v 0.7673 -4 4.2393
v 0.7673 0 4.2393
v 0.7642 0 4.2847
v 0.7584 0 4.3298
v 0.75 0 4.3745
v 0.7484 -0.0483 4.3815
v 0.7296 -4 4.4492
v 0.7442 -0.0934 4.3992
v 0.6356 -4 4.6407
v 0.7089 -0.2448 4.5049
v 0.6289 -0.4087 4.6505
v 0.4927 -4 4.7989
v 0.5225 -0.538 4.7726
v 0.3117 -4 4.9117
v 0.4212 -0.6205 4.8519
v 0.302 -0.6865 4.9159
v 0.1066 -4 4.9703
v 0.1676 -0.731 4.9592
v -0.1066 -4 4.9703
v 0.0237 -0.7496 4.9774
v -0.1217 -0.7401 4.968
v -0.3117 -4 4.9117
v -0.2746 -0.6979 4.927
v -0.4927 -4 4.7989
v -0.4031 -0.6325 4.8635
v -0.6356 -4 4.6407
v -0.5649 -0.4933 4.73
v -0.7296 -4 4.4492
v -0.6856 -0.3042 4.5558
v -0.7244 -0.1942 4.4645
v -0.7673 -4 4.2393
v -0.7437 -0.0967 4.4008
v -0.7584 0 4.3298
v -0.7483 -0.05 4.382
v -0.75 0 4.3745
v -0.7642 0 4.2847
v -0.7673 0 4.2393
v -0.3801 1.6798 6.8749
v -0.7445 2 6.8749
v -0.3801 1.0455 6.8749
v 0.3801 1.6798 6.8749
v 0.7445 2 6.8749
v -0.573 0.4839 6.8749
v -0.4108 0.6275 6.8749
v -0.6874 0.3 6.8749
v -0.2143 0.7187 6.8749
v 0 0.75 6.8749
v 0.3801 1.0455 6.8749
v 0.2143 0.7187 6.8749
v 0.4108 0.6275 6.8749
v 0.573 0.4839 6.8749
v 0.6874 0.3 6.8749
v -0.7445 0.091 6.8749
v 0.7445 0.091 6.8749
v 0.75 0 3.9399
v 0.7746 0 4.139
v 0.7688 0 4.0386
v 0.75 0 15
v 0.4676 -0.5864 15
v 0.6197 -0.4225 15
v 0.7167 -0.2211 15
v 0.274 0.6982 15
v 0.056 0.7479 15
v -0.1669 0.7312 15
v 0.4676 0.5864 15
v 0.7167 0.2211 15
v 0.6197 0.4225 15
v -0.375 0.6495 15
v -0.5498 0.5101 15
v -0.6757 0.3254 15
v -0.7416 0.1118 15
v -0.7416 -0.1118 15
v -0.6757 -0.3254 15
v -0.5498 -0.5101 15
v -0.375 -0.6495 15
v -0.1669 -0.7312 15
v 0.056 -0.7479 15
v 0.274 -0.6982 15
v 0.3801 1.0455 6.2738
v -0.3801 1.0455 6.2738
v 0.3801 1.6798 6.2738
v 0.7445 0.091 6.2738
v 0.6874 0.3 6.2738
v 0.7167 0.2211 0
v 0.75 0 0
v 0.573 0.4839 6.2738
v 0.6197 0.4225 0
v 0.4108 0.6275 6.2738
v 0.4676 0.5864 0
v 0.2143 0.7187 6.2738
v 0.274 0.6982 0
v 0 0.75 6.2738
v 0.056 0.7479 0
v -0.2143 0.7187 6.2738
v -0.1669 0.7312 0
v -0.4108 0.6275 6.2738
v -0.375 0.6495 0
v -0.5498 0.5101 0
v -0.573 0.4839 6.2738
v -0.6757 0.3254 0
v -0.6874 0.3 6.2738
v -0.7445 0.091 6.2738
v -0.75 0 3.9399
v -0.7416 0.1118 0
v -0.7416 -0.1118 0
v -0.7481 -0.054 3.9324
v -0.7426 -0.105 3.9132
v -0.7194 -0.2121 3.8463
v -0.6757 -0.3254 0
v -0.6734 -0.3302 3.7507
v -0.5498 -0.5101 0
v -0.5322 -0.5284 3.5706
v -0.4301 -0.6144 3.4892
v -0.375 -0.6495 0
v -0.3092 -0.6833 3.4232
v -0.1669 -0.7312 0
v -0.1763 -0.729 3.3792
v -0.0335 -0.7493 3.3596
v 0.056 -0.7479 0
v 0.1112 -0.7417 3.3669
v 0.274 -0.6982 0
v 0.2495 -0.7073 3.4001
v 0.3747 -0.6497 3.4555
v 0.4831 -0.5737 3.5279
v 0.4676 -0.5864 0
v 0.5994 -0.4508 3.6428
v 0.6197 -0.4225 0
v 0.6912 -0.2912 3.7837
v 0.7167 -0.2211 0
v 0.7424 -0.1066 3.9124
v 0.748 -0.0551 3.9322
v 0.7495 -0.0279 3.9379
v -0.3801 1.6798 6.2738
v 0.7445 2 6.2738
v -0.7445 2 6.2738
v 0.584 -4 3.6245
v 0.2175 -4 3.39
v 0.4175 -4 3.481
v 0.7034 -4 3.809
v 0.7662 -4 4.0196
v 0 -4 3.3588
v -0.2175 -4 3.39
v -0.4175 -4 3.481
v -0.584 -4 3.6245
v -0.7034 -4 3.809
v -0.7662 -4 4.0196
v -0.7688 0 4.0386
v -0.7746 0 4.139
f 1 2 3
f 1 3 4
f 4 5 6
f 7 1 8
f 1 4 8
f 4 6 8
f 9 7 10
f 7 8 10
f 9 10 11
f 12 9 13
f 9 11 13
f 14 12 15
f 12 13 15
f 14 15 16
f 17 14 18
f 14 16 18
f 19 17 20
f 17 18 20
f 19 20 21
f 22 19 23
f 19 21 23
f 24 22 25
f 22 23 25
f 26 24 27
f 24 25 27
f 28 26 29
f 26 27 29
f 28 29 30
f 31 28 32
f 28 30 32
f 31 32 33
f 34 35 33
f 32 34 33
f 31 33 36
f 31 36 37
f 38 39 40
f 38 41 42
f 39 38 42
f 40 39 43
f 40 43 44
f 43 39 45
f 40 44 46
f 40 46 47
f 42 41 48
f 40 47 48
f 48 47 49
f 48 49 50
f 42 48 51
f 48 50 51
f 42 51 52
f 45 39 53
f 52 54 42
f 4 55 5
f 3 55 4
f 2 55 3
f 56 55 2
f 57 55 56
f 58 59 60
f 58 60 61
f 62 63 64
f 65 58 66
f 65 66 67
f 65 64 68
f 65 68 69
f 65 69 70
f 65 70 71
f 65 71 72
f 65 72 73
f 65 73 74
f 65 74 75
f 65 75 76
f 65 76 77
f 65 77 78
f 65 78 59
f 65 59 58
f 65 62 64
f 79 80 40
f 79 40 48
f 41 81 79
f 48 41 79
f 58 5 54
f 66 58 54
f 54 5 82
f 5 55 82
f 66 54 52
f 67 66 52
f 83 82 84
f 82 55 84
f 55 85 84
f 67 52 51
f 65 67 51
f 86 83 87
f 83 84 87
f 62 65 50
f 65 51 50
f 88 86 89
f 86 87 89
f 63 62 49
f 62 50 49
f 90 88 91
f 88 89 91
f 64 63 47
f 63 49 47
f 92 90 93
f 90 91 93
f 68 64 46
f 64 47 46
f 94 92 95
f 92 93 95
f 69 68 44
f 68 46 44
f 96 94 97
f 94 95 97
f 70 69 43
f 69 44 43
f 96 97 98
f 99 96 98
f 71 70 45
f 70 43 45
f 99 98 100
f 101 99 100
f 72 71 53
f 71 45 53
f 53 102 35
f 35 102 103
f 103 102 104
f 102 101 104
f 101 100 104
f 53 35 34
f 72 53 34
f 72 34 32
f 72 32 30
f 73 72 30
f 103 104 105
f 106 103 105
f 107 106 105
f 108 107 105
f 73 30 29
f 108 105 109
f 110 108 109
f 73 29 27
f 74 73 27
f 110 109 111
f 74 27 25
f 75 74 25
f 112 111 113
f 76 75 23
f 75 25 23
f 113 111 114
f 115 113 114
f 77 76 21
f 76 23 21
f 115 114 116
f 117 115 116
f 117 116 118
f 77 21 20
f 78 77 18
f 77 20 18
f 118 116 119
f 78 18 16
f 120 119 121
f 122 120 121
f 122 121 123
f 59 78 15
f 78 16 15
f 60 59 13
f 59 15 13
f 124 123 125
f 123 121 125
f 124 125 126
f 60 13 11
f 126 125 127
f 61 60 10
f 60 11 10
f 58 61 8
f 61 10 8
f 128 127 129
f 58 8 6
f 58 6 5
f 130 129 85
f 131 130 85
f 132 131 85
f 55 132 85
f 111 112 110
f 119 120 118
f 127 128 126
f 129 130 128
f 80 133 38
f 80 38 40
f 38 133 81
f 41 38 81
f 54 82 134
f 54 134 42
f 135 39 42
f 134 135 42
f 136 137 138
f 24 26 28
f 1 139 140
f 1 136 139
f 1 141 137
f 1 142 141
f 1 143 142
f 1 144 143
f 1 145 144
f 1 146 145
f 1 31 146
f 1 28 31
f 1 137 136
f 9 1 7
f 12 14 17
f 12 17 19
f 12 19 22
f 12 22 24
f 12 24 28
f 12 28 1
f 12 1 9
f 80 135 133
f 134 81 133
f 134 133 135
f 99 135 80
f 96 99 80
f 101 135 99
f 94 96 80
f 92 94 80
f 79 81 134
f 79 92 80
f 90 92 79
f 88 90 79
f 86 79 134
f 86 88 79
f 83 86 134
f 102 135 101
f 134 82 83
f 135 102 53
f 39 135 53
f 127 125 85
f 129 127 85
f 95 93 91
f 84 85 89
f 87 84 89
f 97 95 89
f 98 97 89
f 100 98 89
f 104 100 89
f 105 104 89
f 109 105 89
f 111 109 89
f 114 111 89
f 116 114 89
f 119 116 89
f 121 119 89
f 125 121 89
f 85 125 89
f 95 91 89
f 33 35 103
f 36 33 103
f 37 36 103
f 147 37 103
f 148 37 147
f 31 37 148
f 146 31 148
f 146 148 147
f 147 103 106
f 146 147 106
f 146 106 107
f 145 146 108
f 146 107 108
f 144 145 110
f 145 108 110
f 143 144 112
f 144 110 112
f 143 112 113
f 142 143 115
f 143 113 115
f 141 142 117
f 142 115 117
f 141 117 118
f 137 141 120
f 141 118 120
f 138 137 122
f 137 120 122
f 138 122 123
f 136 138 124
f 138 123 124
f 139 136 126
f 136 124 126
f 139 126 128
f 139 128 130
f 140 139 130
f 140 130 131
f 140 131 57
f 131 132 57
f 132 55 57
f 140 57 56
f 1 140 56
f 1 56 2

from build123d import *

# Parameters (mm, degrees)
F0_R     = 0.75
F1_DEPTH = 15
F2_R     = 0.767857
F3_DEPTH = 4
F4_R     = 0.774571
F5_DEPTH = 4
F6_W     = 1.488906
F6_H     = 0.601098
F7_DEPTH = 2
F8_W     = 0.76025
F8_H     = 0.634269
F9_DEPTH = 25


with BuildPart() as f1:
    # F0 (on Top) → F1 (new body)
    with BuildSketch(Plane.XY):
        Circle(F0_R)
    extrude(amount=F1_DEPTH)

    # F2 (on Front) → F3 (join)
    with BuildSketch(Plane.XZ):
        with Locations((0, 4.209903)):
            Circle(F2_R)
    extrude(amount=F3_DEPTH)

    # F4 (on Front) → F5 (join)
    with BuildSketch(Plane.XZ):
        with Locations((0, 4.133399)):
            Circle(F4_R)
    extrude(amount=F5_DEPTH)

    # F6 (on Front) → F7 (join)
    with BuildSketch(Plane.XZ):
        with Locations((0, 6.574348)):
            Rectangle(F6_W, F6_H)
    extrude(amount=-F7_DEPTH)

    # F8 (on face) → F9 (cut)
    with BuildSketch(Plane(origin=(0, 0, 6.273799), x_dir=(1, 0, 0), z_dir=(0, 0, -1))):
        with Locations((0, -1.362656)):
            Rectangle(F8_W, F8_H)
    extrude(amount=-F9_DEPTH, mode=Mode.SUBTRACT)


solid = f1.part
